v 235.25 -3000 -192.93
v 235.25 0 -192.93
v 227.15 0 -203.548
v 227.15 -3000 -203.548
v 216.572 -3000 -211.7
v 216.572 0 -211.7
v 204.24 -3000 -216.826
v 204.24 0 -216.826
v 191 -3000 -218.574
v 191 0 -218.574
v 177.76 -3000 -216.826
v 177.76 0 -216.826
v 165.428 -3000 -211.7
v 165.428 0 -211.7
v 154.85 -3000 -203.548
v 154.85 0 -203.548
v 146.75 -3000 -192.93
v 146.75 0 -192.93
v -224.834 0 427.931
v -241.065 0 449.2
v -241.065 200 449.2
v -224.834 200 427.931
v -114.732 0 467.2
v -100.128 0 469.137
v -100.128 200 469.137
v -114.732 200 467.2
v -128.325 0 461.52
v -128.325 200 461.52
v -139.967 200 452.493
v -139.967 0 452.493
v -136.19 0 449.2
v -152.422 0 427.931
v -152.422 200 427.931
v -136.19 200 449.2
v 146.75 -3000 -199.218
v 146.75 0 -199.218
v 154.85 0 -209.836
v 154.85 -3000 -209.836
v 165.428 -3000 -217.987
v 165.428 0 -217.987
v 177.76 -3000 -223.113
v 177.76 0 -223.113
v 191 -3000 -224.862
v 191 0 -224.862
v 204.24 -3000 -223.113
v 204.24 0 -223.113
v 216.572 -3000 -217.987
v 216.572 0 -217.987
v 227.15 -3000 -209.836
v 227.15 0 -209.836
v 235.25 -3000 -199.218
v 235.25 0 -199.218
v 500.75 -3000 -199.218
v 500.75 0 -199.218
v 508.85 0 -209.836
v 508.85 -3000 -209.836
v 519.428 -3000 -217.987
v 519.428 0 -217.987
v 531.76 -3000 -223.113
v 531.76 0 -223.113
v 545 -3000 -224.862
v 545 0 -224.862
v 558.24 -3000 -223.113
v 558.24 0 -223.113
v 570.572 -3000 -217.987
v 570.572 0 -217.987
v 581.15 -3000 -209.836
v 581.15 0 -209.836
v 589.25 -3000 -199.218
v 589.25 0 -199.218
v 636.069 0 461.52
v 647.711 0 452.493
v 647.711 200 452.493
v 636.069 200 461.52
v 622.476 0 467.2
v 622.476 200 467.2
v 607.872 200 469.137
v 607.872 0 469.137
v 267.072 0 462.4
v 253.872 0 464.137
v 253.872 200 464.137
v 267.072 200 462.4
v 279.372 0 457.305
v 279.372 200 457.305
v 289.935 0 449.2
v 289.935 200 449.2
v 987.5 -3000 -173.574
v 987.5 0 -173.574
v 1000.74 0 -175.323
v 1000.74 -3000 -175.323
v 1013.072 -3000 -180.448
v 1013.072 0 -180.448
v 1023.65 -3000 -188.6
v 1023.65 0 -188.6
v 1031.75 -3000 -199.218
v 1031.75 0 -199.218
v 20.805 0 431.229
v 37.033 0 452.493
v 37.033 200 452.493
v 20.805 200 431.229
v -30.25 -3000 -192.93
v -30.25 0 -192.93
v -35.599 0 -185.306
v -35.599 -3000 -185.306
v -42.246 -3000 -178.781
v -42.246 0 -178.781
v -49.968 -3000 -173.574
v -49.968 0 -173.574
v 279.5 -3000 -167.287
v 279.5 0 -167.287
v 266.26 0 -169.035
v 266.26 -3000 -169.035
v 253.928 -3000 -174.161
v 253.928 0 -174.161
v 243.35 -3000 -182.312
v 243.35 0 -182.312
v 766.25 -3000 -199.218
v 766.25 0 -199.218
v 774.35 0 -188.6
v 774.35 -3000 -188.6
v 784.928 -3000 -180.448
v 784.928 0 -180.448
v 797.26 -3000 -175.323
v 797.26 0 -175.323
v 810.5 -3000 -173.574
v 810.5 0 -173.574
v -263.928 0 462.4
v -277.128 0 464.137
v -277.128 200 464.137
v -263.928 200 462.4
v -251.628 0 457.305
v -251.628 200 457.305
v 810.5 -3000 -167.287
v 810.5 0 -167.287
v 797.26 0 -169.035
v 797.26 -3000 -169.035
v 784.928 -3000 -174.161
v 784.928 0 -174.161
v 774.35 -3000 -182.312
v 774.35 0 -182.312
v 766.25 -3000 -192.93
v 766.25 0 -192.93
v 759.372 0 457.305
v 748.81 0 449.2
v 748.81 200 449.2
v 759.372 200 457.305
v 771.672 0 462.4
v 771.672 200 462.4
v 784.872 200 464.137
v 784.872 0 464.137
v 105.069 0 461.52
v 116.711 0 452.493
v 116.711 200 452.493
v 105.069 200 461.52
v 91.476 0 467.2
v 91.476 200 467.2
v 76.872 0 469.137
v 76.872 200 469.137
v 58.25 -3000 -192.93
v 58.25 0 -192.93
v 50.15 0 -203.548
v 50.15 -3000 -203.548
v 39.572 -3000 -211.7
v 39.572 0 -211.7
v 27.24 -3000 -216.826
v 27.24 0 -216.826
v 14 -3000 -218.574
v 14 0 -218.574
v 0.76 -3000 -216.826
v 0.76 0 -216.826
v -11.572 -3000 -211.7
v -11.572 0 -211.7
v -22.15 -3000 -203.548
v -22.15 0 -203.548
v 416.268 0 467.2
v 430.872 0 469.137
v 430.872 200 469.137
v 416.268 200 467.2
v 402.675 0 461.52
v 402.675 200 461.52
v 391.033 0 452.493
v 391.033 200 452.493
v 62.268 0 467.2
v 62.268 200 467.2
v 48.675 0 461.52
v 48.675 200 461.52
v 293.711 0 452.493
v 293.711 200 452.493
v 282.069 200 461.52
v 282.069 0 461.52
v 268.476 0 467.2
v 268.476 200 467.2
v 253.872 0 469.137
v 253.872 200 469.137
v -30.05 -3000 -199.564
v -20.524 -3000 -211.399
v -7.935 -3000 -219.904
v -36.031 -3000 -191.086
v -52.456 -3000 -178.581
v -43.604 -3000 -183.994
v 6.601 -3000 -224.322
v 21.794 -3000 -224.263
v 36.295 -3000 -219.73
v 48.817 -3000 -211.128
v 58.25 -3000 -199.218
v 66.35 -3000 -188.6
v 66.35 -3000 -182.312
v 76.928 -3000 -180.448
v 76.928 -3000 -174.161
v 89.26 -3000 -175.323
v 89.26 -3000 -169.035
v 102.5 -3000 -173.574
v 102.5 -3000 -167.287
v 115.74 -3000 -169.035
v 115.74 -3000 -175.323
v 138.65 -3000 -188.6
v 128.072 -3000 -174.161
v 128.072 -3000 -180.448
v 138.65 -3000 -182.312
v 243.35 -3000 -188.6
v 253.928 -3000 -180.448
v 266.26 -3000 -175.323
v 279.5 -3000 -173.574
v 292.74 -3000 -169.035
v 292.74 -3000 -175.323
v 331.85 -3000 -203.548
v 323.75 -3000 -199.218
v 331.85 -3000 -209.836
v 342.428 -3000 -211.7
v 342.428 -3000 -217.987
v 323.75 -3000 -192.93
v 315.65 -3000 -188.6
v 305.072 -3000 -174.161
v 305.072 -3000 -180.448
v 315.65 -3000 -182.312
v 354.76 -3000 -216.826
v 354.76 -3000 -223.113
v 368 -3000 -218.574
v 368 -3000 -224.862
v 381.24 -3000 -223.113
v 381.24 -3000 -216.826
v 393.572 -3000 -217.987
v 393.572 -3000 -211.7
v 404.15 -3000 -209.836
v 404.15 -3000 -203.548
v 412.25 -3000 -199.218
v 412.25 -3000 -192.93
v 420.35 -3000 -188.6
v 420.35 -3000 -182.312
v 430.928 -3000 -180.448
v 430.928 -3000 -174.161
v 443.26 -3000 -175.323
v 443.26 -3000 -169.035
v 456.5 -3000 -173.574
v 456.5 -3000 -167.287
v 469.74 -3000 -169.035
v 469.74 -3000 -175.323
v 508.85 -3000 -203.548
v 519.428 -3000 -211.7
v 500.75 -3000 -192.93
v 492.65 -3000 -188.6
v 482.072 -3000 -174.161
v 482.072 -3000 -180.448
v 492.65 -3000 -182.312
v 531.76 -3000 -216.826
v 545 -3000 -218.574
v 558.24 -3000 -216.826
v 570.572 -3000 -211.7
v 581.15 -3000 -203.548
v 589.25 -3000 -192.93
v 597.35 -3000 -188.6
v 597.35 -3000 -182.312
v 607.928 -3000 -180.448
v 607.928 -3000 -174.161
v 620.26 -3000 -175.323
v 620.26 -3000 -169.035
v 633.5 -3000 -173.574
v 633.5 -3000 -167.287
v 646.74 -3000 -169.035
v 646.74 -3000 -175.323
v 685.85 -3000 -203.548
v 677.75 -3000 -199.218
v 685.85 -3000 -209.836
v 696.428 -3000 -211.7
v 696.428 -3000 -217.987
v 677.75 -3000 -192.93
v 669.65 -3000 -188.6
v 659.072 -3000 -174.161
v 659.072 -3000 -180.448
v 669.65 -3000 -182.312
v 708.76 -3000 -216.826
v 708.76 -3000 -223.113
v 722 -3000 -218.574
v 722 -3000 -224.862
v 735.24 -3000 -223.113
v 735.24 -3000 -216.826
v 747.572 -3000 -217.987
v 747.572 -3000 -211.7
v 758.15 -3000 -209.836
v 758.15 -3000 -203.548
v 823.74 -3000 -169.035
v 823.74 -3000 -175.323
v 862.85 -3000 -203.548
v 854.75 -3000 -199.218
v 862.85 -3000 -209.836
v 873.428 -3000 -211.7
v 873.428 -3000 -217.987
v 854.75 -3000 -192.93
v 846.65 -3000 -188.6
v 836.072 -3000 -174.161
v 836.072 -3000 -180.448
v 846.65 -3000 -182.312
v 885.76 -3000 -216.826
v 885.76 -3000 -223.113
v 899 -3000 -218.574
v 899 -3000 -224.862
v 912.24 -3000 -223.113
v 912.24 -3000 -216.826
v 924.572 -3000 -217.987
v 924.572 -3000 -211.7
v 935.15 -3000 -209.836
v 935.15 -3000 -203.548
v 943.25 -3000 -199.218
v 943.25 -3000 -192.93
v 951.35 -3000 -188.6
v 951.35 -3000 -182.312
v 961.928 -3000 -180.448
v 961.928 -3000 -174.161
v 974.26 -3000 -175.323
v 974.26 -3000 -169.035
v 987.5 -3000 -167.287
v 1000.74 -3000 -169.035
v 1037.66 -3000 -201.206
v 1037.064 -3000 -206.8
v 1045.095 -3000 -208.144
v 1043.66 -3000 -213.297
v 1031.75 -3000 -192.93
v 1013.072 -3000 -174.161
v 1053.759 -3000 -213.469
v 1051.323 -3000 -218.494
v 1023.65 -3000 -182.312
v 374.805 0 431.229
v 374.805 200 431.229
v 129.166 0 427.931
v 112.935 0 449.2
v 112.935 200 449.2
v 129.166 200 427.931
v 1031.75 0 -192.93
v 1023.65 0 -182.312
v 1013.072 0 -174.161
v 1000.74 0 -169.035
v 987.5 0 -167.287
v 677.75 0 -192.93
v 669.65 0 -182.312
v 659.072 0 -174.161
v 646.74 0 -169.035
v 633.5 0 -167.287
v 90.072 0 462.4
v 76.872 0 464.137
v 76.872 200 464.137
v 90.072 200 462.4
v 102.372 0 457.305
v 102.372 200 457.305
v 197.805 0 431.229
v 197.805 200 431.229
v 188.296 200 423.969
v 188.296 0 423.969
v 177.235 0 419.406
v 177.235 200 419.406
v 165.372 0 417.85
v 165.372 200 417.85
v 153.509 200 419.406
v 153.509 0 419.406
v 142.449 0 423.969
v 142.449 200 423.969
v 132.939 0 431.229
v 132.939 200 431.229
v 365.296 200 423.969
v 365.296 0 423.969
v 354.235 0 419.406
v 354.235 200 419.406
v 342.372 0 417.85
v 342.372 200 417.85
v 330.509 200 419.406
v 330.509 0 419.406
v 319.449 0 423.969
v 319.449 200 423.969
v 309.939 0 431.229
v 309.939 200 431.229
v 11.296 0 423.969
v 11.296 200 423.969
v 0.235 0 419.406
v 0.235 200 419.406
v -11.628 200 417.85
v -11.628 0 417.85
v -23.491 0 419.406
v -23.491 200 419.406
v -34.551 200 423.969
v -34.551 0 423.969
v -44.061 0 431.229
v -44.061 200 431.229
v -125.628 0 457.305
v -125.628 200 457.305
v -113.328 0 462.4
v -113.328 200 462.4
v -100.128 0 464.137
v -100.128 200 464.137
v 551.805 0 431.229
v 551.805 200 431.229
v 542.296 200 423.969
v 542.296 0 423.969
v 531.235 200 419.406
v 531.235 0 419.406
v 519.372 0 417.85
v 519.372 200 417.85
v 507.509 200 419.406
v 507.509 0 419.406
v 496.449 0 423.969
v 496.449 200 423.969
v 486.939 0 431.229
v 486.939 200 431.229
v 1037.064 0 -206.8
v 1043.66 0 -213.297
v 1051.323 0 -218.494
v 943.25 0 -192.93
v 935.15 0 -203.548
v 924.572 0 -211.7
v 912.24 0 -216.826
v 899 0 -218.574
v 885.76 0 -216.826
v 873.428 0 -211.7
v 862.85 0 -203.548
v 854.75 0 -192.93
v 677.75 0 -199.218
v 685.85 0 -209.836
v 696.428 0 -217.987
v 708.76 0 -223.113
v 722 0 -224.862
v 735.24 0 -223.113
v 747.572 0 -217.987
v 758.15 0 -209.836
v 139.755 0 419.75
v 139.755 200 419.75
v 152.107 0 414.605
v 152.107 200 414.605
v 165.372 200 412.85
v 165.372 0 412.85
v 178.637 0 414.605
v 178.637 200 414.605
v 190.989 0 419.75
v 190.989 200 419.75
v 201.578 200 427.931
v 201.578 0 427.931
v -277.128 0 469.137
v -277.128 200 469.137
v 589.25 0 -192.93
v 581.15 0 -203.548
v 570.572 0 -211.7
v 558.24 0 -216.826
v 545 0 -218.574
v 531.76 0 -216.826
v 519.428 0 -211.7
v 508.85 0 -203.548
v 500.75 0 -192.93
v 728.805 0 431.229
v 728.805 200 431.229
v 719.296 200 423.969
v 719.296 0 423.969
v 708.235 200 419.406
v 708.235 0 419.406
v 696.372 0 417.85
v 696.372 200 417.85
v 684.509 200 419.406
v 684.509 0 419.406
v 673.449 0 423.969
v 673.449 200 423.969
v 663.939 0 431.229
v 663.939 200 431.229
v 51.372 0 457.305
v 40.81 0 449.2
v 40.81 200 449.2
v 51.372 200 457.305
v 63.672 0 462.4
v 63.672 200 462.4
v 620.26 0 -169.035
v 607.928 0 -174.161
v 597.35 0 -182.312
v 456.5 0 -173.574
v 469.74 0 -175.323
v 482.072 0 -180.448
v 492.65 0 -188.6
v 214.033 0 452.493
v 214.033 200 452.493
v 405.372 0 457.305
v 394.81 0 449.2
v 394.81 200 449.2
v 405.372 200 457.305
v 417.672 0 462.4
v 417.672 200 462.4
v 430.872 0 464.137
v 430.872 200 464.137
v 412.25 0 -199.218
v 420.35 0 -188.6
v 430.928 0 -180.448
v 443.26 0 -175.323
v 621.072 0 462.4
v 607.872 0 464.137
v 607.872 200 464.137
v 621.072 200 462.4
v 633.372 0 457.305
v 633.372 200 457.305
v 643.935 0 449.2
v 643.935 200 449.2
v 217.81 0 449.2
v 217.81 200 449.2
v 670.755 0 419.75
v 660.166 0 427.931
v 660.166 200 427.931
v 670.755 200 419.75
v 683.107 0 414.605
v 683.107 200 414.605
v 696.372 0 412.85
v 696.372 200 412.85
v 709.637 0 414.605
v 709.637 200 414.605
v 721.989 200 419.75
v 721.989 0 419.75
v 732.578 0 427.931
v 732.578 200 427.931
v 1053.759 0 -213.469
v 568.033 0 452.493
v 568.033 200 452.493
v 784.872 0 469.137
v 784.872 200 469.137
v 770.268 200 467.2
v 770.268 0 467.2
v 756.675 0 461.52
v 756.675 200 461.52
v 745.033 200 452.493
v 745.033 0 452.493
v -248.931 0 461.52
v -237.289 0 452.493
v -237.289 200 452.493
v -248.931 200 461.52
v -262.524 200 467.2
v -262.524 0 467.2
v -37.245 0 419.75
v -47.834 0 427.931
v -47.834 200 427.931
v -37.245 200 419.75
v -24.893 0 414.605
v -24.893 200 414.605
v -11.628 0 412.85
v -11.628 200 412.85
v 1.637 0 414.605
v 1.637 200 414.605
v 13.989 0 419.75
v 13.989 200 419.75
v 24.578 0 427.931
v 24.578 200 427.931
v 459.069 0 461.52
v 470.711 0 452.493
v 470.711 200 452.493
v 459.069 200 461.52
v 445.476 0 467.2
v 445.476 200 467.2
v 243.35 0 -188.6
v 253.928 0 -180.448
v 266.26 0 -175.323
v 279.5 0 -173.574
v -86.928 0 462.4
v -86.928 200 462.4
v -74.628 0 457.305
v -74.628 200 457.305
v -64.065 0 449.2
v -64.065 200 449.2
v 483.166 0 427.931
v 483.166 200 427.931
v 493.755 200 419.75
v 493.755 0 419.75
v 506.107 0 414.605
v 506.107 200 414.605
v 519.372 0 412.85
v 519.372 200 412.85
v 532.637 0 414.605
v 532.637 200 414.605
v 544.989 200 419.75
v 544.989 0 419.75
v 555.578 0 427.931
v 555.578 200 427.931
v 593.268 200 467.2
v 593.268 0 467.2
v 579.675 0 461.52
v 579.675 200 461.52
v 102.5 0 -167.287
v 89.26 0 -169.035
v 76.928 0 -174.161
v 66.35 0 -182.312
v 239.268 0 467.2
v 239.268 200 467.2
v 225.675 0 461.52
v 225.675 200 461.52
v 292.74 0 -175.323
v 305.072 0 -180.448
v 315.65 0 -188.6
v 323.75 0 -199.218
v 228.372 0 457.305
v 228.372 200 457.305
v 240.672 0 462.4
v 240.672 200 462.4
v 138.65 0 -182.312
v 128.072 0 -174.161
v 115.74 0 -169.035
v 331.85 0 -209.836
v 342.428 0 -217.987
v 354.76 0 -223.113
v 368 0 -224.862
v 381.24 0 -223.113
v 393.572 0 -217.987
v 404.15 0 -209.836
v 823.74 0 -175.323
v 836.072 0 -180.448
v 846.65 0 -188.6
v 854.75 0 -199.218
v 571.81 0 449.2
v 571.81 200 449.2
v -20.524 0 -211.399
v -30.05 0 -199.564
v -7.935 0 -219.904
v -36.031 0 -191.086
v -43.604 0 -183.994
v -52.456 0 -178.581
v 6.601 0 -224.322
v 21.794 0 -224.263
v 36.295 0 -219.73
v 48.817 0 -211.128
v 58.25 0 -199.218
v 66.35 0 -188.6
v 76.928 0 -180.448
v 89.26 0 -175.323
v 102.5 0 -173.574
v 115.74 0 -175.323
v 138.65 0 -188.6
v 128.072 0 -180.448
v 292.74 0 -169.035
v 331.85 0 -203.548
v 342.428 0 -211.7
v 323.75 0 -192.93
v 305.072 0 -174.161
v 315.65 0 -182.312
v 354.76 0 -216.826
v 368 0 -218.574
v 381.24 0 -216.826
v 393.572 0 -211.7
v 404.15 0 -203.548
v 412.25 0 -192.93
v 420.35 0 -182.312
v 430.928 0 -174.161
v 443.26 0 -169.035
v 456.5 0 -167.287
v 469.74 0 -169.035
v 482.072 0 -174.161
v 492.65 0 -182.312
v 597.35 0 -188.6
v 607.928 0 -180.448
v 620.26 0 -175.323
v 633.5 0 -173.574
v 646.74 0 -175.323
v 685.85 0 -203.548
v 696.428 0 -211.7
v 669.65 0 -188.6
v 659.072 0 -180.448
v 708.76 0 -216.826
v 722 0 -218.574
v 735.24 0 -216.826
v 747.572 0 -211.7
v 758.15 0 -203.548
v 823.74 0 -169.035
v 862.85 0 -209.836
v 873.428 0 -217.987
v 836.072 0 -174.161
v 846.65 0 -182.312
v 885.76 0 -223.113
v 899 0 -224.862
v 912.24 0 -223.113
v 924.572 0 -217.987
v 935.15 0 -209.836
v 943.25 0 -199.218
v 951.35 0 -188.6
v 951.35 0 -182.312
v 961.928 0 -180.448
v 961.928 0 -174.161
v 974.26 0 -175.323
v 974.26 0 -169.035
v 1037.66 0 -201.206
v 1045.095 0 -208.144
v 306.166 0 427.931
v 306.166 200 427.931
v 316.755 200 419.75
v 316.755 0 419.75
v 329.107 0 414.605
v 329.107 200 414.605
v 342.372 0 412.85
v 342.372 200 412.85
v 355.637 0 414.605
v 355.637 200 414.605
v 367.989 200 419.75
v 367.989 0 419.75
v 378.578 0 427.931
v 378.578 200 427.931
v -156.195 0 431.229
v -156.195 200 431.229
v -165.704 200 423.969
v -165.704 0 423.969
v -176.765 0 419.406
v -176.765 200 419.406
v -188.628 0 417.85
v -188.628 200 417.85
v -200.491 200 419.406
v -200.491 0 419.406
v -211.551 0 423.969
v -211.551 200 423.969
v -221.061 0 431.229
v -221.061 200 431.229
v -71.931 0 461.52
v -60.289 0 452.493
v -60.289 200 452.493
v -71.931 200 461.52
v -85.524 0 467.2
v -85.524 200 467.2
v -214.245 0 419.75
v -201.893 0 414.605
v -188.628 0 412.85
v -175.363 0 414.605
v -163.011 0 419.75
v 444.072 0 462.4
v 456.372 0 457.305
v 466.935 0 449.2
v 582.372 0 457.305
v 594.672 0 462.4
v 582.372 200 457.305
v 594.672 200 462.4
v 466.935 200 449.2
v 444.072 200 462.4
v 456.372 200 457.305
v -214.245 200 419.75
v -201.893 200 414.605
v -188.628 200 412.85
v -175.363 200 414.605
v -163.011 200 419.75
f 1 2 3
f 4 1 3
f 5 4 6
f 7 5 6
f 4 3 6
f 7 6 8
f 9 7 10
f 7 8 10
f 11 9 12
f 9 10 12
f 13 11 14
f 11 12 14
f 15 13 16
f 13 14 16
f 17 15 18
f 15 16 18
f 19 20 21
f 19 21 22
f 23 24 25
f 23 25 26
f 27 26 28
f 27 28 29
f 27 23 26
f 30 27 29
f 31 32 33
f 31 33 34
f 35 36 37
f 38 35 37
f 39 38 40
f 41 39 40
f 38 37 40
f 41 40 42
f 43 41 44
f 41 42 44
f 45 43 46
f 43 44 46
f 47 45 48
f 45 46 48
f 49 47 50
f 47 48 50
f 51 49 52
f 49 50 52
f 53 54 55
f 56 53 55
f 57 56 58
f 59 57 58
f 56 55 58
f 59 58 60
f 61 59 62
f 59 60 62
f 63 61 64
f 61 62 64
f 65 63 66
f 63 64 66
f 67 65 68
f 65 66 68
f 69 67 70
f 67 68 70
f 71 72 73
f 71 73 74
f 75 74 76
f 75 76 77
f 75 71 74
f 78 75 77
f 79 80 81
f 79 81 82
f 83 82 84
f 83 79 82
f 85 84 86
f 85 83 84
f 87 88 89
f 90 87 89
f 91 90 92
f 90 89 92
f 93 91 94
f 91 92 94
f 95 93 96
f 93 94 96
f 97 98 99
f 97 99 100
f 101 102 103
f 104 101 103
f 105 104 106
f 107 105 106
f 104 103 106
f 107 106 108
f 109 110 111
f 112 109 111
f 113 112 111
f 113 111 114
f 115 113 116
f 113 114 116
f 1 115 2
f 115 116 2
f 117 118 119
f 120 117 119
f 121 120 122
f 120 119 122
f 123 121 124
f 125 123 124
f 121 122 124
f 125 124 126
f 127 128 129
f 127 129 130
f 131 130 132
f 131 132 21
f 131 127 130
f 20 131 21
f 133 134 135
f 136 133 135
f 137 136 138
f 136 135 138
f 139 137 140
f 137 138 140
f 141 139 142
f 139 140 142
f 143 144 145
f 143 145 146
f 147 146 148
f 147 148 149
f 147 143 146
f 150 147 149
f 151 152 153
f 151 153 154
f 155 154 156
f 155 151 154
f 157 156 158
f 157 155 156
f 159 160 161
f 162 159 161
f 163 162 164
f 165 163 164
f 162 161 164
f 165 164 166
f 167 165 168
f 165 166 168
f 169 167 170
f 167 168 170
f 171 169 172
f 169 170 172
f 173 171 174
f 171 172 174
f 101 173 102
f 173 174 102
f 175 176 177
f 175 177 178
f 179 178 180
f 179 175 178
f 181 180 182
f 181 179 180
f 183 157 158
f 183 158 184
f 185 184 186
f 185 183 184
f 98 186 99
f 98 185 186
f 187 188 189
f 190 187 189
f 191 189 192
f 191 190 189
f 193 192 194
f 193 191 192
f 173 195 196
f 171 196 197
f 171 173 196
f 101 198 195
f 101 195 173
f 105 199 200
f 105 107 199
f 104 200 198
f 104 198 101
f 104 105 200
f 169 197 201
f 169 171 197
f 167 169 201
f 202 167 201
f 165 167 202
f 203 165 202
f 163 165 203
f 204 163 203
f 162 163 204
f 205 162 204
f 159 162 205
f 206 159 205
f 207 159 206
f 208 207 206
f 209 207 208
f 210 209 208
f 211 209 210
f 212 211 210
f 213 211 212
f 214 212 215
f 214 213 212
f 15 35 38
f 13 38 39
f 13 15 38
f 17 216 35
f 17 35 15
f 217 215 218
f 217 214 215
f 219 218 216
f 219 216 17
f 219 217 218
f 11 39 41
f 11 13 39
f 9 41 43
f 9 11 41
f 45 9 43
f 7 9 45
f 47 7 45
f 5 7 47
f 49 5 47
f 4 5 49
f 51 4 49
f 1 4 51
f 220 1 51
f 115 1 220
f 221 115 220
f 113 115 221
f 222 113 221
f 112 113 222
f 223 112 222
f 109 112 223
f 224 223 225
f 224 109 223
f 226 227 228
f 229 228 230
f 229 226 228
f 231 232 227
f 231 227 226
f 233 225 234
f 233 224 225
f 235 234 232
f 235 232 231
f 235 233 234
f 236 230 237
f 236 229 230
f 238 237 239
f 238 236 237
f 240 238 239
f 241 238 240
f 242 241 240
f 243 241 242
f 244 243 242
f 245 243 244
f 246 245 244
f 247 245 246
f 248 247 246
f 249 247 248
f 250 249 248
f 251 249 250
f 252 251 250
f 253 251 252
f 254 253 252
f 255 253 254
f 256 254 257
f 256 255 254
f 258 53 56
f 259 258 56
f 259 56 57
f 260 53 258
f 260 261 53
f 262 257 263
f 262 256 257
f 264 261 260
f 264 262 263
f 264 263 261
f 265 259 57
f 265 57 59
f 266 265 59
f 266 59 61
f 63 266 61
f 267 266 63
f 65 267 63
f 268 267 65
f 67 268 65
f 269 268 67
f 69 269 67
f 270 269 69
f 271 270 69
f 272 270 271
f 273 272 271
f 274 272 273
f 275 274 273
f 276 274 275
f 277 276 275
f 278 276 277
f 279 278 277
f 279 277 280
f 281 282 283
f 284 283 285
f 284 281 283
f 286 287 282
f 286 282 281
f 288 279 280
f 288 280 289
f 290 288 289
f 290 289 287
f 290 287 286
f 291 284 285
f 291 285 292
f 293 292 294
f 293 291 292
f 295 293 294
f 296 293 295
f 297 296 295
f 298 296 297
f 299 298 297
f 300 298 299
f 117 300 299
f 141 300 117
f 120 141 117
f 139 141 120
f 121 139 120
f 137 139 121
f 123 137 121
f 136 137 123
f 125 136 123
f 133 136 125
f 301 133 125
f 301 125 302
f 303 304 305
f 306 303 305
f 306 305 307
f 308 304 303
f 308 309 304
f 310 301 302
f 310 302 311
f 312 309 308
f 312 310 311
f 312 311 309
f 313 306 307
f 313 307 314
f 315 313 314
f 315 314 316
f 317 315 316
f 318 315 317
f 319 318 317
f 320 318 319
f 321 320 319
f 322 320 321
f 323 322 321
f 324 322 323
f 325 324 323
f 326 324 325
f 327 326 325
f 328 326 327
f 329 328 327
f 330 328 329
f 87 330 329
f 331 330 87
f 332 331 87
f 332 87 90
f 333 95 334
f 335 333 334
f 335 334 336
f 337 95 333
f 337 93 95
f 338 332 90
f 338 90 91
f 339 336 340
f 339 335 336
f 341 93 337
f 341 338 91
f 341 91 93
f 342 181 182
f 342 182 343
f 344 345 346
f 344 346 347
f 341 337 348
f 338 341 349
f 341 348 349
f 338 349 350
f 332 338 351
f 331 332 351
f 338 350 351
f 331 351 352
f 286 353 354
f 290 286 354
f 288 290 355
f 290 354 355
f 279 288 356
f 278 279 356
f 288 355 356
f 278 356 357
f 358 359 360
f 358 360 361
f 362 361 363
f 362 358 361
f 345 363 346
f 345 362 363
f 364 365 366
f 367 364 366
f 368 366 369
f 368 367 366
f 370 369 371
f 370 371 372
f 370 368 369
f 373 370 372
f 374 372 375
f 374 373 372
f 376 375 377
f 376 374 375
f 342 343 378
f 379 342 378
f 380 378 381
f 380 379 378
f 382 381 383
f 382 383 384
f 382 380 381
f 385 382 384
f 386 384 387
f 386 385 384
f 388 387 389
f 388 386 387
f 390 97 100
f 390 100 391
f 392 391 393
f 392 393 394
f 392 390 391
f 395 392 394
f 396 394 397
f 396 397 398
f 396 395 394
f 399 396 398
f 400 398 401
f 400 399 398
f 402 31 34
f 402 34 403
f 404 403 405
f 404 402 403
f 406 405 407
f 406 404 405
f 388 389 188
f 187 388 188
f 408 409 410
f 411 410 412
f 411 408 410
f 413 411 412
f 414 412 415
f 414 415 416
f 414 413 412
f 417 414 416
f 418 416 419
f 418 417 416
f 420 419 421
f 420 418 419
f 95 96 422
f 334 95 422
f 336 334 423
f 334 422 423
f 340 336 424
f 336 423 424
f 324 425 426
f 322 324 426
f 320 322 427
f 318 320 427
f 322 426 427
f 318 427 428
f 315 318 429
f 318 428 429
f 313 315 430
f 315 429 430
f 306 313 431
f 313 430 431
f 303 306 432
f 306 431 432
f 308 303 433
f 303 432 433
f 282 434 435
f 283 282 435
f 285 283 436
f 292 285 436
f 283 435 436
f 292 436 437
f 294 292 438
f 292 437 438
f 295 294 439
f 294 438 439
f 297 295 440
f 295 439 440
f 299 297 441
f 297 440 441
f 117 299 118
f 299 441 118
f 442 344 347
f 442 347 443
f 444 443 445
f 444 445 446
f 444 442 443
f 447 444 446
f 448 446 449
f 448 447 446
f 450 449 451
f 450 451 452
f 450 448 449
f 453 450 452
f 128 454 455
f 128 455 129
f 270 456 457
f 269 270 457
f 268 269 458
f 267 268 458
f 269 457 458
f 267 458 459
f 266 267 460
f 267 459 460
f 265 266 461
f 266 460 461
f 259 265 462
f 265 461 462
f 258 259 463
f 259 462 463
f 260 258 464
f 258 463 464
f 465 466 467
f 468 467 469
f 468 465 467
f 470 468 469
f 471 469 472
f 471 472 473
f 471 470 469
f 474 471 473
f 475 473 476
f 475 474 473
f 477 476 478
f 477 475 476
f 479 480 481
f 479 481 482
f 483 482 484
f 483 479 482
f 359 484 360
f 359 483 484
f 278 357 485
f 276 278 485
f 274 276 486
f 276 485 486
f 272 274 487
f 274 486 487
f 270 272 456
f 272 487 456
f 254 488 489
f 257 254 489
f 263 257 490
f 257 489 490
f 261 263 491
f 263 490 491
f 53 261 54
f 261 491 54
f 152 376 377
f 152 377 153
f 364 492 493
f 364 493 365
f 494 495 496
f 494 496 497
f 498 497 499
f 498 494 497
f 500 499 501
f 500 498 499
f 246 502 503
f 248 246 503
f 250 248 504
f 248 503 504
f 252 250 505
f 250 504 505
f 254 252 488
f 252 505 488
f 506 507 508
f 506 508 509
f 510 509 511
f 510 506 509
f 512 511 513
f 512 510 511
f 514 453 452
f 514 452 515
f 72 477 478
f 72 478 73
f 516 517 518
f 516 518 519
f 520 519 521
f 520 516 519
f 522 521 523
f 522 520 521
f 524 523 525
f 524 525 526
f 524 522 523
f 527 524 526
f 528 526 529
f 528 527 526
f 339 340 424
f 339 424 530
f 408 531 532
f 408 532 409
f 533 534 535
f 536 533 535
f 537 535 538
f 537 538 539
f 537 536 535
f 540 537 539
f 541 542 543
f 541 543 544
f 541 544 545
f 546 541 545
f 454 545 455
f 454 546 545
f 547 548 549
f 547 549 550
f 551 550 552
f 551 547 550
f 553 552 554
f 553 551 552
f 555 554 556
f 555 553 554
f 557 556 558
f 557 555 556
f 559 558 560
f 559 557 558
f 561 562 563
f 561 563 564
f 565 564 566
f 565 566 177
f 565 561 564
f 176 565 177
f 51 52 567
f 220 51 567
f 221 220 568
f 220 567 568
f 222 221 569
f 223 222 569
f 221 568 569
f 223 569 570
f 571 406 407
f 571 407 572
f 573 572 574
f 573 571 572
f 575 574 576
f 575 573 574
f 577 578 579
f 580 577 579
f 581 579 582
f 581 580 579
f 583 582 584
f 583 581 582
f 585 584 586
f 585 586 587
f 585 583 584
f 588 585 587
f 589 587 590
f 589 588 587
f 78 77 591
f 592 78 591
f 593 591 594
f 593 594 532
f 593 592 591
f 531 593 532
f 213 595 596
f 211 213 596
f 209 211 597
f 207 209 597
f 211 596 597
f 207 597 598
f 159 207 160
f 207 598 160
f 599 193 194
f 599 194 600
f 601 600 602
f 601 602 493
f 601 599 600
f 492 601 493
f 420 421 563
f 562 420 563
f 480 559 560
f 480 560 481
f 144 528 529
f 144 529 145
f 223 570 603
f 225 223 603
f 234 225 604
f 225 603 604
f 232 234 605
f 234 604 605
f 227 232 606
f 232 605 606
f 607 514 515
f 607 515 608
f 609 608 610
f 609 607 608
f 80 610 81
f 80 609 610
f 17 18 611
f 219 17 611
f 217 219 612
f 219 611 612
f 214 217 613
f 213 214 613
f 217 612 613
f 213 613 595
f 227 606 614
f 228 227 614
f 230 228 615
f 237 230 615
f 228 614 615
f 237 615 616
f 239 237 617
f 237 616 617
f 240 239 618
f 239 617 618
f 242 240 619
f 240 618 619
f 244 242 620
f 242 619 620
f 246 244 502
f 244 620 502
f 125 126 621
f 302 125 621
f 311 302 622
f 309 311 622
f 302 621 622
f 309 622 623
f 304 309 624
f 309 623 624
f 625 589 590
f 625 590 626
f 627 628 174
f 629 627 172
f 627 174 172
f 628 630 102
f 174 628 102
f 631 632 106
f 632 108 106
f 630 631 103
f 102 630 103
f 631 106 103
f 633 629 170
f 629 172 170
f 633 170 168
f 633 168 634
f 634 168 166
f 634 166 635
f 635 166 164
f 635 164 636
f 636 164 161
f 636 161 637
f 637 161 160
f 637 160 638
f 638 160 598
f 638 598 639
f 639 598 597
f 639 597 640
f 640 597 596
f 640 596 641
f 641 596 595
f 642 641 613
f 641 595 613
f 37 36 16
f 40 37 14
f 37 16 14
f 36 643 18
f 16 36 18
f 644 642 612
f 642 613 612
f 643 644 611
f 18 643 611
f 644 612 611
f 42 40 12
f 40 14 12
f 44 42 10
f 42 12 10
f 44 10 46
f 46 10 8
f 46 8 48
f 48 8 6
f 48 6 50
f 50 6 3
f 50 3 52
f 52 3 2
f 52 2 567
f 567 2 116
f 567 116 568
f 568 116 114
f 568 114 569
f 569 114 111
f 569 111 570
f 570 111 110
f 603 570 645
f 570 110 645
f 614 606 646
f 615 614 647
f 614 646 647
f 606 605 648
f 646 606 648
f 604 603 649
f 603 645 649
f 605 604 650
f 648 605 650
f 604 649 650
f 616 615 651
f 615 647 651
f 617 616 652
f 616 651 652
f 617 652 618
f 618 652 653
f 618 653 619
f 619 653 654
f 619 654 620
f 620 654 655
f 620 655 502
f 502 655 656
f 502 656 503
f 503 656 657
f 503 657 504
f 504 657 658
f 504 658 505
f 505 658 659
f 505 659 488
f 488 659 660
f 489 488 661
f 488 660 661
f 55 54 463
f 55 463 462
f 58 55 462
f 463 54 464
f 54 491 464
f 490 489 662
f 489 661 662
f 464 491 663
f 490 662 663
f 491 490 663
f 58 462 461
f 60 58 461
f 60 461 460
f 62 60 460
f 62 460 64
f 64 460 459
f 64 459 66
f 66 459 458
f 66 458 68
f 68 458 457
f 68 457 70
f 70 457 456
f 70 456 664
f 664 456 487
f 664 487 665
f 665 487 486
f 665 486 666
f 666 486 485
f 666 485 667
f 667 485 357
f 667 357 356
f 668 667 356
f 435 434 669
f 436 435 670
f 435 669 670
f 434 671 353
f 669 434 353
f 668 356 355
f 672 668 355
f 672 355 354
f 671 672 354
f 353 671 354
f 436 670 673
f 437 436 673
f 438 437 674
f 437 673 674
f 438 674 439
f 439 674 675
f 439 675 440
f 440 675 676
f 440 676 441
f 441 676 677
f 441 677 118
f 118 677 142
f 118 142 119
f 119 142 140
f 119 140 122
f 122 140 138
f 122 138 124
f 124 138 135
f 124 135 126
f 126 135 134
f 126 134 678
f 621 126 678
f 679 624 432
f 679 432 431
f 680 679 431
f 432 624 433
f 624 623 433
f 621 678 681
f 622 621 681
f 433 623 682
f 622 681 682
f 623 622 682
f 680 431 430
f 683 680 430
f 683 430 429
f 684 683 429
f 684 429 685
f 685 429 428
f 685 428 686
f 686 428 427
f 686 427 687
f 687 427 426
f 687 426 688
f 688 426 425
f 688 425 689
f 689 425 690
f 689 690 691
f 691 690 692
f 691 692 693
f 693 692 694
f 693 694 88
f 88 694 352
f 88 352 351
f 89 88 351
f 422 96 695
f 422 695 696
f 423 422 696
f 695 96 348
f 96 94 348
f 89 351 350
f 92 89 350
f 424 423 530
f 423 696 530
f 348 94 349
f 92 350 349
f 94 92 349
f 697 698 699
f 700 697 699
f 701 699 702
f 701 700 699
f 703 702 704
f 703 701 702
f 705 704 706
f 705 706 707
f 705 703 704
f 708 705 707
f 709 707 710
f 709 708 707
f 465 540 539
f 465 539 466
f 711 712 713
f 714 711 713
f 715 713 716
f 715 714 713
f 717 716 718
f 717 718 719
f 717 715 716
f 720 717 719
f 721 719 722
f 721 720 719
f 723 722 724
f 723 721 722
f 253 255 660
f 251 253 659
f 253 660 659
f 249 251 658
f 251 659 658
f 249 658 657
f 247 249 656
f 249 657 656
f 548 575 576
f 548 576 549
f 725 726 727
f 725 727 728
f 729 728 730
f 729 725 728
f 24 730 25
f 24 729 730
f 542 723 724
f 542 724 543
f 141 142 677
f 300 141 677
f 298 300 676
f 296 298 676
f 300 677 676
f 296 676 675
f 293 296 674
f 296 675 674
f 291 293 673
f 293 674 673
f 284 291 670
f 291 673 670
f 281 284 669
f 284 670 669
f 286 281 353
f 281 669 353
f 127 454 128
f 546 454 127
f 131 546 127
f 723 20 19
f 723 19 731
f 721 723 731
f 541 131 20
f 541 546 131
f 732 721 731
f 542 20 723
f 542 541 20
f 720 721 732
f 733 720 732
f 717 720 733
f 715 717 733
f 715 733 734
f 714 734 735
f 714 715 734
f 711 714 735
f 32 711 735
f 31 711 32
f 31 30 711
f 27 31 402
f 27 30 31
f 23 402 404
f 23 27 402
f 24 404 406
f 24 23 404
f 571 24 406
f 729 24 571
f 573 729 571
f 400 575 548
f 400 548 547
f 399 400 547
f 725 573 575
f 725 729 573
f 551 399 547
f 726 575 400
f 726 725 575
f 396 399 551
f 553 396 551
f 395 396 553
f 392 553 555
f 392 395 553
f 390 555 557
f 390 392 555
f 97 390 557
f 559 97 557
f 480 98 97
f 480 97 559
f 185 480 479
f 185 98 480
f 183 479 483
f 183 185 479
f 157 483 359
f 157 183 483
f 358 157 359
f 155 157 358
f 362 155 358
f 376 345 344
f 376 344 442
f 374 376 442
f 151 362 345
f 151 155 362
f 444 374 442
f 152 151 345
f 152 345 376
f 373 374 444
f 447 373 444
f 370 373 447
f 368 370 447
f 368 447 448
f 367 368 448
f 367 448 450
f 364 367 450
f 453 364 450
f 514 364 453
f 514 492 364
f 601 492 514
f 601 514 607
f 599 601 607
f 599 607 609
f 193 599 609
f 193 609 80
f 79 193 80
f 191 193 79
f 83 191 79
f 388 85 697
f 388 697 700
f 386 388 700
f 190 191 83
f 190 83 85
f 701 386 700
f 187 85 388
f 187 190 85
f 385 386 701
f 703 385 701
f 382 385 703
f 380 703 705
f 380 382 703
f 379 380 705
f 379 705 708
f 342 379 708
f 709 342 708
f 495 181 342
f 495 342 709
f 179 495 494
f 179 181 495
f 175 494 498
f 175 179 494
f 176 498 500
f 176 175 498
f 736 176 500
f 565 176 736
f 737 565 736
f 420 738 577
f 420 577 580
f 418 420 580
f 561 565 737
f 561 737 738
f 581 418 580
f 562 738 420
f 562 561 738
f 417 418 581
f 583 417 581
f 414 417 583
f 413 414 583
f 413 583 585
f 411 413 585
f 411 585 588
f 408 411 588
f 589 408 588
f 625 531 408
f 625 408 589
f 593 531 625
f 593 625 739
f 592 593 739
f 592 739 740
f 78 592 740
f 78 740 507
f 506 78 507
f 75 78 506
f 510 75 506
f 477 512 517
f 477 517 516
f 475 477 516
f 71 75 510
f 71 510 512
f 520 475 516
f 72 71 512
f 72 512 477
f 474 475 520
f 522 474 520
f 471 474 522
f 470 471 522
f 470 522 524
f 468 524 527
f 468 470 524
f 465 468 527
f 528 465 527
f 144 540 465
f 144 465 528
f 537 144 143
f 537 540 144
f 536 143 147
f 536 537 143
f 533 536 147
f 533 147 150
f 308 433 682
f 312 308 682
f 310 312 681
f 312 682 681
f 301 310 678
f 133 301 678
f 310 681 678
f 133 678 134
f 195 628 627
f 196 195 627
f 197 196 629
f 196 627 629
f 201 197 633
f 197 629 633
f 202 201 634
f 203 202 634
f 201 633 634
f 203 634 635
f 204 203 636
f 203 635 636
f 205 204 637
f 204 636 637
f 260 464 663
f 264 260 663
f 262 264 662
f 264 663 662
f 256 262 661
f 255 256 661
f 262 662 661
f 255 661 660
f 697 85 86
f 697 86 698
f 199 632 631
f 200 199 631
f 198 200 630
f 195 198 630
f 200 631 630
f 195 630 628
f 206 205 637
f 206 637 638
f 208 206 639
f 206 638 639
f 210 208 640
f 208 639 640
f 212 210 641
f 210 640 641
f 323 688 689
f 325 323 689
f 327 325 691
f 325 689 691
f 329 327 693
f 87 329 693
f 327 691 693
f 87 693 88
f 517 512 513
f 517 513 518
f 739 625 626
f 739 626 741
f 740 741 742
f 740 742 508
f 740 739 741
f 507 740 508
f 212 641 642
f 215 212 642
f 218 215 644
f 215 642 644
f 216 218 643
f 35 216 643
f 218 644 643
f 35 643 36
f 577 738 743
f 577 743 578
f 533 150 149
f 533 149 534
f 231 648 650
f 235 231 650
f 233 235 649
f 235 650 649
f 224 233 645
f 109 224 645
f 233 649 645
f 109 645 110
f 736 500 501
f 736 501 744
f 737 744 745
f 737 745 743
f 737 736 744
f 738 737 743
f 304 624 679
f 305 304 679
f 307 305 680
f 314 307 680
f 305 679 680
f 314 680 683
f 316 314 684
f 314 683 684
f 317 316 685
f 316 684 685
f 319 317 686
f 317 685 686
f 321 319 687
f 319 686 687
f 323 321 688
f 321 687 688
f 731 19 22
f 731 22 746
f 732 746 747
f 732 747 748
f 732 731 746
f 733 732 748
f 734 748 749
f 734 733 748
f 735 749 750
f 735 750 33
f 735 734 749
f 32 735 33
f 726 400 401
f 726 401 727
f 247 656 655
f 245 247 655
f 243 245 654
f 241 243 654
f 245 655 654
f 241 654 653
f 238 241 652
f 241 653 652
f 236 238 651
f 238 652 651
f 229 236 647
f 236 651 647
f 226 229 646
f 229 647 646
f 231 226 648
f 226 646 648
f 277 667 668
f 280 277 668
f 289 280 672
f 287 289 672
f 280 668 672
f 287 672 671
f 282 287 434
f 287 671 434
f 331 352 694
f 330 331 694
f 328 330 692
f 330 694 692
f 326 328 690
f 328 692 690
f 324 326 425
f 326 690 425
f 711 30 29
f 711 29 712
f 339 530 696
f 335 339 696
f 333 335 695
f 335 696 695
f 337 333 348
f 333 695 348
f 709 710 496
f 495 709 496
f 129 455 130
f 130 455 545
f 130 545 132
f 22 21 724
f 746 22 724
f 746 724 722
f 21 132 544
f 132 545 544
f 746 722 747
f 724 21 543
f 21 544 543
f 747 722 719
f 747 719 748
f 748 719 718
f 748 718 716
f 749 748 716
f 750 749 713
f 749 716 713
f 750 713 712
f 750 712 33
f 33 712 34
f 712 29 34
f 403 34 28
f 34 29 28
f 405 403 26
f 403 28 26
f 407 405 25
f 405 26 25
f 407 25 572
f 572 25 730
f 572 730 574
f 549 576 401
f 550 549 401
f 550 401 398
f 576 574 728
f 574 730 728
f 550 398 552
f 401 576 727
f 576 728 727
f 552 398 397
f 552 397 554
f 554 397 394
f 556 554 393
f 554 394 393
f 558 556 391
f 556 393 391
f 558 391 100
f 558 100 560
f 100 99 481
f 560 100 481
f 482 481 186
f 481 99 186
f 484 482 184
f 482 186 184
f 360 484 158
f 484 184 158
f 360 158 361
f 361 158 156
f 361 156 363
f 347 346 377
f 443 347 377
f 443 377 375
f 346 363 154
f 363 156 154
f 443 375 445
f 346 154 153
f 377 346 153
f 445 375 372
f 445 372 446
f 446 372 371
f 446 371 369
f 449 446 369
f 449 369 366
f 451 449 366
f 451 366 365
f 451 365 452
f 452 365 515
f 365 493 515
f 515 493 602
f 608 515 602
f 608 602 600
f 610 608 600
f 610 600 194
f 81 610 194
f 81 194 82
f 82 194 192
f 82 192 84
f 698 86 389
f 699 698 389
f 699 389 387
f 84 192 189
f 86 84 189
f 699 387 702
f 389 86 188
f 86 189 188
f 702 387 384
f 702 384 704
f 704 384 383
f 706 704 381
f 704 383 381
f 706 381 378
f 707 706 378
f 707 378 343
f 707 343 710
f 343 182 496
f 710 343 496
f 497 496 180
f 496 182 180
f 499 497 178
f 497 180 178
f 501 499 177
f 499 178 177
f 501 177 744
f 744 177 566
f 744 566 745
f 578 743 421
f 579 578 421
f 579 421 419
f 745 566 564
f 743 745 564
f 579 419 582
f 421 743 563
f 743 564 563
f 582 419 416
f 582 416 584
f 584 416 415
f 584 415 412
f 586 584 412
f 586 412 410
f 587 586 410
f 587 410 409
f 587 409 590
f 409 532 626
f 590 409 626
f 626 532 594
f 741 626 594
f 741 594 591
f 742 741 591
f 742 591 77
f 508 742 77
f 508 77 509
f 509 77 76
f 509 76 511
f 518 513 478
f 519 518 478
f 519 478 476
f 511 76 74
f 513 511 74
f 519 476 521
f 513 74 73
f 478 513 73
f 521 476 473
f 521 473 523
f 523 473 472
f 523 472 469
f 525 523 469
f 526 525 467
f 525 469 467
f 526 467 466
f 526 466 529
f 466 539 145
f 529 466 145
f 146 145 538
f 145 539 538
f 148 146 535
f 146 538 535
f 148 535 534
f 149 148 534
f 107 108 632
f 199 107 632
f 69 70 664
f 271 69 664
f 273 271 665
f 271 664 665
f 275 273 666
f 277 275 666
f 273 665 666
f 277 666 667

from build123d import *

# Parameters (mm, degrees)
F1_DEPTH = 25
F2_DEPTH = 3000
F4_DEPTH = 200


with BuildPart() as f1:
    # F0 (on Front) → F1 (new body)
    with BuildSketch(Plane.XZ):
        with BuildLine():
            ThreePointArc((-52.455625, -178.581003), (-39.636878, -187.346668), (-30.050142, -199.563528))
            ThreePointArc((-30.050142, -199.563528), (14.199629, -224.861274), (58.249991, -199.217877))
            ThreePointArc((58.249991, -199.217877), (76.928198, -180.448321), (102.499991, -173.574089))
            ThreePointArc((102.499991, -173.574089), (128.071783, -180.448321), (146.749991, -199.217877))
            ThreePointArc((146.749991, -199.217877), (190.999991, -224.861665), (235.249991, -199.217877))
            ThreePointArc((235.249991, -199.217877), (253.928198, -180.448321), (279.499991, -173.574089))
            ThreePointArc((279.499991, -173.574089), (305.071783, -180.448321), (323.749991, -199.217877))
            ThreePointArc((323.749991, -199.217877), (367.999991, -224.861665), (412.249991, -199.217877))
            ThreePointArc((412.249991, -199.217877), (430.928198, -180.448321), (456.499991, -173.574089))
            ThreePointArc((456.499991, -173.574089), (482.071783, -180.448321), (500.749991, -199.217877))
            ThreePointArc((500.749991, -199.217877), (544.999991, -224.861665), (589.249991, -199.217877))
            ThreePointArc((589.249991, -199.217877), (607.928198, -180.448321), (633.499991, -173.574089))
            ThreePointArc((633.499991, -173.574089), (659.071783, -180.448321), (677.749991, -199.217877))
            ThreePointArc((677.749991, -199.217877), (721.999991, -224.861665), (766.249991, -199.217877))
            ThreePointArc((766.249991, -199.217877), (784.928198, -180.448321), (810.499991, -173.574089))
            ThreePointArc((810.499991, -173.574089), (836.071783, -180.448321), (854.749991, -199.217877))
            ThreePointArc((854.749991, -199.217877), (898.999991, -224.861665), (943.249991, -199.217877))
            ThreePointArc((943.249991, -199.217877), (961.928198, -180.448321), (987.499991, -173.574089))
            ThreePointArc((987.499991, -173.574089), (1013.071783, -180.448321), (1031.749991, -199.217877))
            ThreePointArc((1031.749991, -199.217877), (1040.214237, -210.198696), (1051.323161, -218.494098))
            Line((1051.323161, -218.494098), (1053.758551, -213.468733))
            ThreePointArc((1053.758551, -213.468733), (1041.204378, -204.860351), (1031.749991, -192.930301))
            ThreePointArc((1031.749991, -192.930301), (1013.071783, -174.160745), (987.499991, -167.286514))
            ThreePointArc((987.499991, -167.286514), (961.928198, -174.160745), (943.249991, -192.930301))
            ThreePointArc((943.249991, -192.930301), (898.999991, -218.574089), (854.749991, -192.930301))
            ThreePointArc((854.749991, -192.930301), (836.071783, -174.160745), (810.499991, -167.286514))
            ThreePointArc((810.499991, -167.286514), (784.928198, -174.160745), (766.249991, -192.930301))
            ThreePointArc((766.249991, -192.930301), (721.999991, -218.574089), (677.749991, -192.930301))
            ThreePointArc((677.749991, -192.930301), (659.071783, -174.160745), (633.499991, -167.286514))
            ThreePointArc((633.499991, -167.286514), (607.928198, -174.160745), (589.249991, -192.930301))
            ThreePointArc((589.249991, -192.930301), (544.999991, -218.574089), (500.749991, -192.930301))
            ThreePointArc((500.749991, -192.930301), (482.071783, -174.160745), (456.499991, -167.286514))
            ThreePointArc((456.499991, -167.286514), (430.928198, -174.160745), (412.249991, -192.930301))
            ThreePointArc((412.249991, -192.930301), (367.999991, -218.574089), (323.749991, -192.930301))
            ThreePointArc((323.749991, -192.930301), (305.071783, -174.160745), (279.499991, -167.286514))
            ThreePointArc((279.499991, -167.286514), (253.928198, -174.160745), (235.249991, -192.930301))
            ThreePointArc((235.249991, -192.930301), (190.999991, -218.574089), (146.749991, -192.930301))
            ThreePointArc((146.749991, -192.930301), (128.071783, -174.160745), (102.499991, -167.286514))
            ThreePointArc((102.499991, -167.286514), (76.928198, -174.160745), (58.249991, -192.930301))
            ThreePointArc((58.249991, -192.930301), (13.999991, -218.574089), (-30.250009, -192.930301))
            ThreePointArc((-30.250009, -192.930301), (-38.773372, -181.891358), (-49.968416, -173.574089))
            Line((-49.968416, -173.574089), (-52.455625, -178.581003))
        make_face()
    extrude(amount=F1_DEPTH)

    # F0 (on Front) → F2 (join)
    with BuildSketch(Plane.XZ):
        with BuildLine():
            ThreePointArc((-52.455625, -178.581003), (-39.636878, -187.346668), (-30.050142, -199.563528))
            ThreePointArc((-30.050142, -199.563528), (14.199629, -224.861274), (58.249991, -199.217877))
            ThreePointArc((58.249991, -199.217877), (76.928198, -180.448321), (102.499991, -173.574089))
            ThreePointArc((102.499991, -173.574089), (128.071783, -180.448321), (146.749991, -199.217877))
            ThreePointArc((146.749991, -199.217877), (190.999991, -224.861665), (235.249991, -199.217877))
            ThreePointArc((235.249991, -199.217877), (253.928198, -180.448321), (279.499991, -173.574089))
            ThreePointArc((279.499991, -173.574089), (305.071783, -180.448321), (323.749991, -199.217877))
            ThreePointArc((323.749991, -199.217877), (367.999991, -224.861665), (412.249991, -199.217877))
            ThreePointArc((412.249991, -199.217877), (430.928198, -180.448321), (456.499991, -173.574089))
            ThreePointArc((456.499991, -173.574089), (482.071783, -180.448321), (500.749991, -199.217877))
            ThreePointArc((500.749991, -199.217877), (544.999991, -224.861665), (589.249991, -199.217877))
            ThreePointArc((589.249991, -199.217877), (607.928198, -180.448321), (633.499991, -173.574089))
            ThreePointArc((633.499991, -173.574089), (659.071783, -180.448321), (677.749991, -199.217877))
            ThreePointArc((677.749991, -199.217877), (721.999991, -224.861665), (766.249991, -199.217877))
            ThreePointArc((766.249991, -199.217877), (784.928198, -180.448321), (810.499991, -173.574089))
            ThreePointArc((810.499991, -173.574089), (836.071783, -180.448321), (854.749991, -199.217877))
            ThreePointArc((854.749991, -199.217877), (898.999991, -224.861665), (943.249991, -199.217877))
            ThreePointArc((943.249991, -199.217877), (961.928198, -180.448321), (987.499991, -173.574089))
            ThreePointArc((987.499991, -173.574089), (1013.071783, -180.448321), (1031.749991, -199.217877))
            ThreePointArc((1031.749991, -199.217877), (1040.214237, -210.198696), (1051.323161, -218.494098))
            Line((1051.323161, -218.494098), (1053.758551, -213.468733))
            ThreePointArc((1053.758551, -213.468733), (1041.204378, -204.860351), (1031.749991, -192.930301))
            ThreePointArc((1031.749991, -192.930301), (1013.071783, -174.160745), (987.499991, -167.286514))
            ThreePointArc((987.499991, -167.286514), (961.928198, -174.160745), (943.249991, -192.930301))
            ThreePointArc((943.249991, -192.930301), (898.999991, -218.574089), (854.749991, -192.930301))
            ThreePointArc((854.749991, -192.930301), (836.071783, -174.160745), (810.499991, -167.286514))
            ThreePointArc((810.499991, -167.286514), (784.928198, -174.160745), (766.249991, -192.930301))
            ThreePointArc((766.249991, -192.930301), (721.999991, -218.574089), (677.749991, -192.930301))
            ThreePointArc((677.749991, -192.930301), (659.071783, -174.160745), (633.499991, -167.286514))
            ThreePointArc((633.499991, -167.286514), (607.928198, -174.160745), (589.249991, -192.930301))
            ThreePointArc((589.249991, -192.930301), (544.999991, -218.574089), (500.749991, -192.930301))
            ThreePointArc((500.749991, -192.930301), (482.071783, -174.160745), (456.499991, -167.286514))
            ThreePointArc((456.499991, -167.286514), (430.928198, -174.160745), (412.249991, -192.930301))
            ThreePointArc((412.249991, -192.930301), (367.999991, -218.574089), (323.749991, -192.930301))
            ThreePointArc((323.749991, -192.930301), (305.071783, -174.160745), (279.499991, -167.286514))
            ThreePointArc((279.499991, -167.286514), (253.928198, -174.160745), (235.249991, -192.930301))
            ThreePointArc((235.249991, -192.930301), (190.999991, -218.574089), (146.749991, -192.930301))
            ThreePointArc((146.749991, -192.930301), (128.071783, -174.160745), (102.499991, -167.286514))
            ThreePointArc((102.499991, -167.286514), (76.928198, -174.160745), (58.249991, -192.930301))
            ThreePointArc((58.249991, -192.930301), (13.999991, -218.574089), (-30.250009, -192.930301))
            ThreePointArc((-30.250009, -192.930301), (-38.773372, -181.891358), (-49.968416, -173.574089))
            Line((-49.968416, -173.574089), (-52.455625, -178.581003))
        make_face()
    extrude(amount=F2_DEPTH)


with BuildPart() as f4:
    # F3 (on Front) → F4 (new body)
    with BuildSketch(Plane.XZ):
        with BuildLine():
            ThreePointArc((-277.127914, 464.137359), (-257.611059, 460.255215), (-241.065468, 449.199805))
            Line((-241.065468, 449.199805), (-224.833861, 427.931412))
            ThreePointArc((-224.833861, 427.931412), (-188.627914, 412.849784), (-152.421967, 427.931412))
            Line((-152.421967, 427.931412), (-136.190359, 449.199805))
            ThreePointArc((-136.190359, 449.199805), (-119.644769, 460.255215), (-100.127914, 464.137359))
            ThreePointArc((-100.127914, 464.137359), (-80.611059, 460.255215), (-64.065468, 449.199805))
            Line((-64.065468, 449.199805), (-47.833861, 427.931412))
            ThreePointArc((-47.833861, 427.931412), (-11.627914, 412.849784), (24.578033, 427.931412))
            Line((24.578033, 427.931412), (40.809641, 449.199805))
            ThreePointArc((40.809641, 449.199805), (57.355231, 460.255215), (76.872086, 464.137359))
            ThreePointArc((76.872086, 464.137359), (96.388941, 460.255215), (112.934532, 449.199805))
            Line((112.934532, 449.199805), (129.166139, 427.931412))
            ThreePointArc((129.166139, 427.931412), (165.372086, 412.849784), (201.578033, 427.931412))
            Line((201.578033, 427.931412), (217.809641, 449.199805))
            ThreePointArc((217.809641, 449.199805), (234.355231, 460.255215), (253.872086, 464.137359))
            ThreePointArc((253.872086, 464.137359), (273.388941, 460.255215), (289.934532, 449.199805))
            Line((289.934532, 449.199805), (306.166139, 427.931412))
            ThreePointArc((306.166139, 427.931412), (342.372086, 412.849784), (378.578033, 427.931412))
            Line((378.578033, 427.931412), (394.809641, 449.199805))
            ThreePointArc((394.809641, 449.199805), (411.355231, 460.255215), (430.872086, 464.137359))
            ThreePointArc((430.872086, 464.137359), (450.388941, 460.255215), (466.934532, 449.199805))
            Line((466.934532, 449.199805), (483.166139, 427.931412))
            ThreePointArc((483.166139, 427.931412), (519.372086, 412.849784), (555.578033, 427.931412))
            Line((555.578033, 427.931412), (571.809641, 449.199805))
            ThreePointArc((571.809641, 449.199805), (588.355231, 460.255215), (607.872086, 464.137359))
            ThreePointArc((607.872086, 464.137359), (627.388941, 460.255215), (643.934532, 449.199805))
            Line((643.934532, 449.199805), (660.166139, 427.931412))
            ThreePointArc((660.166139, 427.931412), (696.372086, 412.849784), (732.578033, 427.931412))
            Line((732.578033, 427.931412), (748.809641, 449.199805))
            ThreePointArc((748.809641, 449.199805), (765.355231, 460.255215), (784.872086, 464.137359))
            Line((784.872086, 464.137359), (784.872086, 469.137372))
            ThreePointArc((784.872086, 469.137372), (763.283896, 464.808932), (745.032961, 452.492734))
            Line((745.032961, 452.492734), (728.805137, 431.229299))
            ThreePointArc((728.805137, 431.229299), (696.372086, 417.849796), (663.939035, 431.229299))
            Line((663.939035, 431.229299), (647.711212, 452.492734))
            ThreePointArc((647.711212, 452.492734), (629.460277, 464.808932), (607.872086, 469.137372))
            ThreePointArc((607.872086, 469.137372), (586.283896, 464.808932), (568.032961, 452.492734))
            Line((568.032961, 452.492734), (551.805137, 431.229299))
            ThreePointArc((551.805137, 431.229299), (519.372086, 417.849796), (486.939035, 431.229299))
            Line((486.939035, 431.229299), (470.711212, 452.492734))
            ThreePointArc((470.711212, 452.492734), (452.460277, 464.808932), (430.872086, 469.137372))
            ThreePointArc((430.872086, 469.137372), (409.283896, 464.808932), (391.032961, 452.492734))
            Line((391.032961, 452.492734), (374.805137, 431.229299))
            ThreePointArc((374.805137, 431.229299), (342.372086, 417.849796), (309.939035, 431.229299))
            Line((309.939035, 431.229299), (293.711212, 452.492734))
            ThreePointArc((293.711212, 452.492734), (275.460277, 464.808932), (253.872086, 469.137372))
            ThreePointArc((253.872086, 469.137372), (232.283896, 464.808932), (214.032961, 452.492734))
            Line((214.032961, 452.492734), (197.805137, 431.229299))
            ThreePointArc((197.805137, 431.229299), (165.372086, 417.849796), (132.939035, 431.229299))
            Line((132.939035, 431.229299), (116.711212, 452.492734))
            ThreePointArc((116.711212, 452.492734), (98.460277, 464.808932), (76.872086, 469.137372))
            ThreePointArc((76.872086, 469.137372), (55.283896, 464.808932), (37.032961, 452.492734))
            Line((37.032961, 452.492734), (20.805137, 431.229299))
            ThreePointArc((20.805137, 431.229299), (-11.627914, 417.849796), (-44.060965, 431.229299))
            Line((-44.060965, 431.229299), (-60.288788, 452.492734))
            ThreePointArc((-60.288788, 452.492734), (-78.539723, 464.808932), (-100.127914, 469.137372))
            ThreePointArc((-100.127914, 469.137372), (-121.716104, 464.808932), (-139.967039, 452.492734))
            Line((-139.967039, 452.492734), (-156.194863, 431.229299))
            ThreePointArc((-156.194863, 431.229299), (-188.627914, 417.849796), (-221.060965, 431.229299))
            Line((-221.060965, 431.229299), (-237.288788, 452.492734))
            ThreePointArc((-237.288788, 452.492734), (-255.539723, 464.808932), (-277.127914, 469.137372))
            Line((-277.127914, 469.137372), (-277.127914, 464.137359))
        make_face()
    extrude(amount=-F4_DEPTH)


solid = Compound([f1.part, f4.part])
